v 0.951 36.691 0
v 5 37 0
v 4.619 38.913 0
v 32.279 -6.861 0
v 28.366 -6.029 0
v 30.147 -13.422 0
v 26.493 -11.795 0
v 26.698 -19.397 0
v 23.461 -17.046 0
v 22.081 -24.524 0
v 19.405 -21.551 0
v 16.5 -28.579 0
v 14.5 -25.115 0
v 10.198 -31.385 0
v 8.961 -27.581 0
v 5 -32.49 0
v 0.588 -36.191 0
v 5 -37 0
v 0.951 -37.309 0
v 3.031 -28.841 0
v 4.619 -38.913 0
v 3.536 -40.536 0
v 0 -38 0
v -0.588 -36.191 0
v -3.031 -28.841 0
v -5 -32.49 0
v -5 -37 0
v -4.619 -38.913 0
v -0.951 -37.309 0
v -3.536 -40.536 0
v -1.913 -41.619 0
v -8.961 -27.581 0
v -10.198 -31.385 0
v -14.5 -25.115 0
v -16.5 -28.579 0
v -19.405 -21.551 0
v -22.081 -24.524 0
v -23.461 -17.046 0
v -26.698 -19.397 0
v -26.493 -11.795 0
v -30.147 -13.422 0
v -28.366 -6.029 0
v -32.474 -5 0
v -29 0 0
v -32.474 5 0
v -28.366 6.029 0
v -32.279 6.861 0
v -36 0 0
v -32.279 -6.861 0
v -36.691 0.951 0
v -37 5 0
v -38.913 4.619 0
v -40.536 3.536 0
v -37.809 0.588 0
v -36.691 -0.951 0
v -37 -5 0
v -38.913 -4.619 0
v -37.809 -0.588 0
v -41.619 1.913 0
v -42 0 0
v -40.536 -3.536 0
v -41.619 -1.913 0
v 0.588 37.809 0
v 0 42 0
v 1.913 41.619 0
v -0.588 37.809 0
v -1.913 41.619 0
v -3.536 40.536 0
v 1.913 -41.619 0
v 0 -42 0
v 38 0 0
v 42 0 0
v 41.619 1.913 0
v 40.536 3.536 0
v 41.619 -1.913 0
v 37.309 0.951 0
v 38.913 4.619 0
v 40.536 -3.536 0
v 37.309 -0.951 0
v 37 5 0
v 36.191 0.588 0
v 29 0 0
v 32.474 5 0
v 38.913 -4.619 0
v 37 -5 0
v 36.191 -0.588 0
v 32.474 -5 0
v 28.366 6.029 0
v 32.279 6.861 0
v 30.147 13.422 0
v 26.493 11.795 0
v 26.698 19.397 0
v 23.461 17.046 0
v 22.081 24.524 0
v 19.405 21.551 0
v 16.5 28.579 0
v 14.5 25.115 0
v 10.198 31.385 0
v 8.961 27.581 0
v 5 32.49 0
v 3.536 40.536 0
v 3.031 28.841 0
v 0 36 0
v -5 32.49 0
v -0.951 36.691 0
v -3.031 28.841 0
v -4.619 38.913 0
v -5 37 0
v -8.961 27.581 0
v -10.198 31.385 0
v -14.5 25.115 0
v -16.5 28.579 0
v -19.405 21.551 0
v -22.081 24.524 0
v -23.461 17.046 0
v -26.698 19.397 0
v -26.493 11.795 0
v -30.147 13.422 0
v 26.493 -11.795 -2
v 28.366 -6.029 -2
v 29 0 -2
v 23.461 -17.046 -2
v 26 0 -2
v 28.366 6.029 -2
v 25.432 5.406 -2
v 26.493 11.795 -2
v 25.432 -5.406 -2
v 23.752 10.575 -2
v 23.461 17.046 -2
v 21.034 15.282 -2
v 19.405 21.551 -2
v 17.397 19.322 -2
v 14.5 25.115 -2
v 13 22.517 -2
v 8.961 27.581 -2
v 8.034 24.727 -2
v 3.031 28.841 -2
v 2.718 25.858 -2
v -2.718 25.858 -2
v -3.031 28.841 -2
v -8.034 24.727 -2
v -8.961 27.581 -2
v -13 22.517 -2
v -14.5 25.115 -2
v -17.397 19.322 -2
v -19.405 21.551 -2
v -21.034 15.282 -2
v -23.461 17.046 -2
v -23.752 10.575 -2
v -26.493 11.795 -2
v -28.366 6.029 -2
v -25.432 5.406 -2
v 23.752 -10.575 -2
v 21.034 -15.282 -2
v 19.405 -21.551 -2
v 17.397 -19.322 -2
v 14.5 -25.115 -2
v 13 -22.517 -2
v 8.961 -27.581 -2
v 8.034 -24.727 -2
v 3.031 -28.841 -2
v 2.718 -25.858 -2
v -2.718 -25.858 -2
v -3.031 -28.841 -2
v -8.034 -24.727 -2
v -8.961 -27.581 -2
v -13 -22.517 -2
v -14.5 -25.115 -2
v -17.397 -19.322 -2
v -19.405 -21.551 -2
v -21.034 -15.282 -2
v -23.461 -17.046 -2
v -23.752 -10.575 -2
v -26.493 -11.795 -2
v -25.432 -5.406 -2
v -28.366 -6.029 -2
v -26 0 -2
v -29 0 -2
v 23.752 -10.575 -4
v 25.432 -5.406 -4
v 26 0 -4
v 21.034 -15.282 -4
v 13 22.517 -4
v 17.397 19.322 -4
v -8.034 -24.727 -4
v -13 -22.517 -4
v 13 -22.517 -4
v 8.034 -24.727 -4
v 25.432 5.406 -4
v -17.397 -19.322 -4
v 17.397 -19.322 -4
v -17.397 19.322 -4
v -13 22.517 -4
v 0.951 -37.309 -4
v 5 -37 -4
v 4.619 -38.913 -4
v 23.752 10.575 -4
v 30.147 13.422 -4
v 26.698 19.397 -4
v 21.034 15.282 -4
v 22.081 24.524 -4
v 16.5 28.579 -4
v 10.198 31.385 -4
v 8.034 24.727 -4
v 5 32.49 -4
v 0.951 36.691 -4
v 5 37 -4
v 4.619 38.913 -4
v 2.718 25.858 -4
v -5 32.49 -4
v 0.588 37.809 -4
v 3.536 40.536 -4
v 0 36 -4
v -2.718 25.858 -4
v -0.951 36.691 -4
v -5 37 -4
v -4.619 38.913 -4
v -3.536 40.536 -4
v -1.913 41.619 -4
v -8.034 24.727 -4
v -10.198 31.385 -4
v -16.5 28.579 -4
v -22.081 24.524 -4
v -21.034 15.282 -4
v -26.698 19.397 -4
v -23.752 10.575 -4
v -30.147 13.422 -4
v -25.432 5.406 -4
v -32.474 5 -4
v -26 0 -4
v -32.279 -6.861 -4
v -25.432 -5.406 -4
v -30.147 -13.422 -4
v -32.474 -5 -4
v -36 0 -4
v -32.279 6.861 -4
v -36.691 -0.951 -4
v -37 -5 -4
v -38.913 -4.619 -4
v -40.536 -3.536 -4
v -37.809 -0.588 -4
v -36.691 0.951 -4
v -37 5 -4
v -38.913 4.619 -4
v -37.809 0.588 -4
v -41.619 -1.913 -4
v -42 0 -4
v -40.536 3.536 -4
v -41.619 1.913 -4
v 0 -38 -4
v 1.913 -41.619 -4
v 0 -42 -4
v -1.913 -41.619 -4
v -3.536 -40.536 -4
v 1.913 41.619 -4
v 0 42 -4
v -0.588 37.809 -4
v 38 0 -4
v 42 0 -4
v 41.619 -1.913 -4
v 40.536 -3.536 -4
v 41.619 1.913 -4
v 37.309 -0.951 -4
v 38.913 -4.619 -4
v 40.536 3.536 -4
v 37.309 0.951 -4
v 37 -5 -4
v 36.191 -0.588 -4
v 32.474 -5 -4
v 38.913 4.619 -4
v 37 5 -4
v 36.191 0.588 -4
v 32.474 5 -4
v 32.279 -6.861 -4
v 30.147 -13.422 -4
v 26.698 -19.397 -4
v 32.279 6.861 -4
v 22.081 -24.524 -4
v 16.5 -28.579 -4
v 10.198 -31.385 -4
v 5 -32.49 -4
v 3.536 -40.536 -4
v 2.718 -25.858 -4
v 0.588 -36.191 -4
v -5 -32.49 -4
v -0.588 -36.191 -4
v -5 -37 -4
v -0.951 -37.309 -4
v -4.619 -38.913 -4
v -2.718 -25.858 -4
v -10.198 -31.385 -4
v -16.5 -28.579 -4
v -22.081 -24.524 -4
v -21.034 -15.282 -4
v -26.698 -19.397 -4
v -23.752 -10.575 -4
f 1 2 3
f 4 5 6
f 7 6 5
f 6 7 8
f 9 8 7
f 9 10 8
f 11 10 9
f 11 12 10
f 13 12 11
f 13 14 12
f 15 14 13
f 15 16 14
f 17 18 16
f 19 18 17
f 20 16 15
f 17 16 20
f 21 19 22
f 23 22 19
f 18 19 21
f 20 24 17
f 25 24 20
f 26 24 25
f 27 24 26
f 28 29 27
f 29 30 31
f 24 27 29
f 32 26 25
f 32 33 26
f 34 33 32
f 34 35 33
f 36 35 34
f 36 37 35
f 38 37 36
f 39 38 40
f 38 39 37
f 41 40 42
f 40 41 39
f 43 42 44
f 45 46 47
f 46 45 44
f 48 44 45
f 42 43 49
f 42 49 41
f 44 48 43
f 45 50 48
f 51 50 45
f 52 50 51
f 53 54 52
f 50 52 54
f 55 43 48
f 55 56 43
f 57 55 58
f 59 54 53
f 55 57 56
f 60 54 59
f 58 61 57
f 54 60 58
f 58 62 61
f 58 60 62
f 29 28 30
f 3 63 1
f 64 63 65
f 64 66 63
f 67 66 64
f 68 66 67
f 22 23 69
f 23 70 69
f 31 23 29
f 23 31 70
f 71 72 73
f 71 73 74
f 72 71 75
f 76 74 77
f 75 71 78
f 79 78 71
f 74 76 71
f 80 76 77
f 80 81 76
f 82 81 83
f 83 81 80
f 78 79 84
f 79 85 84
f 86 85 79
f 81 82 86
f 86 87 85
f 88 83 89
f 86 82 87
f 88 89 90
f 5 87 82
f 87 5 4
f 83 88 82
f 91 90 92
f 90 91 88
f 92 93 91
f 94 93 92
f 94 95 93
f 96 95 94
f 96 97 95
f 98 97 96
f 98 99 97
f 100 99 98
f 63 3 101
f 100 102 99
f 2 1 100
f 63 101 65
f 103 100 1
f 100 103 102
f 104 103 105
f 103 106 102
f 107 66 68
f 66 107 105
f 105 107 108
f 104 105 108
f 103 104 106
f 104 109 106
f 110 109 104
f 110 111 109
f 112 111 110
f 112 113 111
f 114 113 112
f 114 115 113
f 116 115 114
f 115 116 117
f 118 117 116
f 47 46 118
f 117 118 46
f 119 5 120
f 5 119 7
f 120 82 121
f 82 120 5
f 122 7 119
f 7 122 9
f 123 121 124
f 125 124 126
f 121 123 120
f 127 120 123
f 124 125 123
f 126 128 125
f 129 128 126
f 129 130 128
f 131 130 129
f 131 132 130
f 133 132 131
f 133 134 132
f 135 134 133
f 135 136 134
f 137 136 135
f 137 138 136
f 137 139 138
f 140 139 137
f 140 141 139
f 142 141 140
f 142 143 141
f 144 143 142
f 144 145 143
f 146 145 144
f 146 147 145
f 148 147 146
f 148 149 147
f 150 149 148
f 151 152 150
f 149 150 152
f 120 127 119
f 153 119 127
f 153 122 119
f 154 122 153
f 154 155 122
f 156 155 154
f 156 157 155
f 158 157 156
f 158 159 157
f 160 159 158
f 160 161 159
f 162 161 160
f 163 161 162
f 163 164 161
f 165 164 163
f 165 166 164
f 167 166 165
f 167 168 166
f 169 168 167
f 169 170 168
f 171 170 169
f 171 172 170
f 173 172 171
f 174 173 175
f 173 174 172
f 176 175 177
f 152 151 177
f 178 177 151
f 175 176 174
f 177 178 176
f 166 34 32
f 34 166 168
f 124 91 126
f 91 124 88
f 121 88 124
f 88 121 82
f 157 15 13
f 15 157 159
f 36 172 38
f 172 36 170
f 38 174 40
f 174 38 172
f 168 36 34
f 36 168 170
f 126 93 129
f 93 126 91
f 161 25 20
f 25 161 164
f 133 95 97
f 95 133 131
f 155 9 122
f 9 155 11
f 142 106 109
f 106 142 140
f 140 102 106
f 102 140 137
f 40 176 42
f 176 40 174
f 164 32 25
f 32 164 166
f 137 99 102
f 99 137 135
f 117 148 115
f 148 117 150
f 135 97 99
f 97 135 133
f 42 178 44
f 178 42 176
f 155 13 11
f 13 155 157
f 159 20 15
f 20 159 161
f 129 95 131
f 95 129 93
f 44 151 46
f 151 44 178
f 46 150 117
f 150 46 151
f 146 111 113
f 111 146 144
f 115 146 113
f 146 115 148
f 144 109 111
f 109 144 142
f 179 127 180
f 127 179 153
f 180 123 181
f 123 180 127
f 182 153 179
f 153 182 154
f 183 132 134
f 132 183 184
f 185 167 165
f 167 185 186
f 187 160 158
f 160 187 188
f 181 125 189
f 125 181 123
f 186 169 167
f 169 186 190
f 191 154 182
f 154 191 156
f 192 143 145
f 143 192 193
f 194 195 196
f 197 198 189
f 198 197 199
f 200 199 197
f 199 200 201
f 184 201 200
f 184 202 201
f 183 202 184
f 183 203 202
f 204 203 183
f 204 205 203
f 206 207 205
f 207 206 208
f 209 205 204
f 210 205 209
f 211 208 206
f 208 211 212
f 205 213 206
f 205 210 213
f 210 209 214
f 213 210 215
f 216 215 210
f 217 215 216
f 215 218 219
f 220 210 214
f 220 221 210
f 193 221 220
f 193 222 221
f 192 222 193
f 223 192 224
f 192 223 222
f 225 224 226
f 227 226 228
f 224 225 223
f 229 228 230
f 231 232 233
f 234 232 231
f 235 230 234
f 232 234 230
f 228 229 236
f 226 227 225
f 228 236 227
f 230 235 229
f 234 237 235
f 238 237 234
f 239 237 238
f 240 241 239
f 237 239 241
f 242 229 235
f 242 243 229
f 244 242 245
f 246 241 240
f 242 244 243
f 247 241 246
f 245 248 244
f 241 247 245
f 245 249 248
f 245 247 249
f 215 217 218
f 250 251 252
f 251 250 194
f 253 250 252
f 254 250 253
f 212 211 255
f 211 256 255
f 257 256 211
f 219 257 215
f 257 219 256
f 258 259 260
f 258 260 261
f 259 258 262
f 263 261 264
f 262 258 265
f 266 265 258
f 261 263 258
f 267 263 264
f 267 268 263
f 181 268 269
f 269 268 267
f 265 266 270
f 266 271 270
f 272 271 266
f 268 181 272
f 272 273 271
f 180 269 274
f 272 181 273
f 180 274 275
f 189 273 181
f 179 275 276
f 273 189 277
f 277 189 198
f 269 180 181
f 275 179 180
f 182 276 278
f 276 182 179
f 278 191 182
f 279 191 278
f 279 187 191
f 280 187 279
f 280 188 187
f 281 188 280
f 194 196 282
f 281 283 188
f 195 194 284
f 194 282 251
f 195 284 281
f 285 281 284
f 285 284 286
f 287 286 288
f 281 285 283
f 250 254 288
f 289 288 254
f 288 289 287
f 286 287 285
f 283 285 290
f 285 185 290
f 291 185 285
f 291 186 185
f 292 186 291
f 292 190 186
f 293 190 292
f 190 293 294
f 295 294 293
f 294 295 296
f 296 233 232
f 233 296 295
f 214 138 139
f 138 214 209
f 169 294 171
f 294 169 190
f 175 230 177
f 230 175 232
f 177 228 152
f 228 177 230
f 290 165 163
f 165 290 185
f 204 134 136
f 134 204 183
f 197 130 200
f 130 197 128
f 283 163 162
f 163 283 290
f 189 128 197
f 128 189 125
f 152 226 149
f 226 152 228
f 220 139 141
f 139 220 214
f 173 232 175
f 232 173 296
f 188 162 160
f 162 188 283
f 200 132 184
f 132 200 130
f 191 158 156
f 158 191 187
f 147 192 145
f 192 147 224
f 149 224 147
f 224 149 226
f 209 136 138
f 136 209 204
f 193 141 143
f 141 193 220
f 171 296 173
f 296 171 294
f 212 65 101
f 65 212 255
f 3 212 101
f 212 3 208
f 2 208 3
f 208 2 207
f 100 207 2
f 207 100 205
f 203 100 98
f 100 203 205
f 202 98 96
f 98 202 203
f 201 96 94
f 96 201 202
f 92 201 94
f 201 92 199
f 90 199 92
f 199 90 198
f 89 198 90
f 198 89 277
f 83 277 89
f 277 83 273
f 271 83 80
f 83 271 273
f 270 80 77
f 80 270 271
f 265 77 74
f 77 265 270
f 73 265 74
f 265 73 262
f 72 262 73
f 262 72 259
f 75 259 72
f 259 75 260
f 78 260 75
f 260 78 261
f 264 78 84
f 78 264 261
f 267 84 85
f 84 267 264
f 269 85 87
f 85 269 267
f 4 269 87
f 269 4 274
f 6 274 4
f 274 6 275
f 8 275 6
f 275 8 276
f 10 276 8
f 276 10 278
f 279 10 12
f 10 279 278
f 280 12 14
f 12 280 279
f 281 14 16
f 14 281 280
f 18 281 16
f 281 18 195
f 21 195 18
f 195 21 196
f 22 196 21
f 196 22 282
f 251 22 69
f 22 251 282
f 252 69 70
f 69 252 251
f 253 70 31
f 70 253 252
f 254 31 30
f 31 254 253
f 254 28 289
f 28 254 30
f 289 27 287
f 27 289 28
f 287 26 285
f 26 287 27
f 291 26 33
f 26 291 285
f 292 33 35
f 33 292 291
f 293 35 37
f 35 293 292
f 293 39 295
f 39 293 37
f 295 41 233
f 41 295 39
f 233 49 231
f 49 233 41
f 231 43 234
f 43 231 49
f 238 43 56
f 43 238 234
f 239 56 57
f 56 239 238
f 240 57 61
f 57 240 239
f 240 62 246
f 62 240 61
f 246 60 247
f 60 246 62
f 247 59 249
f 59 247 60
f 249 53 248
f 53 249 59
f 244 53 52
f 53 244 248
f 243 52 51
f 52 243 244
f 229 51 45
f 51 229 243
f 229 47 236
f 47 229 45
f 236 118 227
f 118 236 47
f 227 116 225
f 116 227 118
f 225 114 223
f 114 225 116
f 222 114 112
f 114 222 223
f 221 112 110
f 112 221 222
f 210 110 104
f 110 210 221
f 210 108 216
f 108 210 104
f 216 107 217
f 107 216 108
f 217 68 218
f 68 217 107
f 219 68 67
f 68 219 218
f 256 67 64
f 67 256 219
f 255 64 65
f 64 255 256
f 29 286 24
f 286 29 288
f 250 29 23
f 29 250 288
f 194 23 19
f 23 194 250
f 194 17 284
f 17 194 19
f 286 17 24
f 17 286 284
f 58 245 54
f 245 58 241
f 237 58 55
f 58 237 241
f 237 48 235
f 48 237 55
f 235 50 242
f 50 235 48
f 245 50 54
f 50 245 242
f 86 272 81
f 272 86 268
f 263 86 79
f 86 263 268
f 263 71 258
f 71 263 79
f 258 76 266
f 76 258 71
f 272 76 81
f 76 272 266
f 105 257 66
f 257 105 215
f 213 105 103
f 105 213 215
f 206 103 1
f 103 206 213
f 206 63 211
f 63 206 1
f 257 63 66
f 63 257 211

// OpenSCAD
// Total width of the holder including the tabs
cross_length = 74;

// The width of the tabs the screws go into
cross_width = 10;

// The diameter of the round part
holder_diameter = 66;

// The speaker diameter; include some padding
speaker_diameter = 58;

// The size of the screw hole
screw_radius = 1;

// The depth of the part holding the speaker flange
flange_depth = 2;

// The width of the flange
flange_width = 3;

// The total height of the holder
height = 4;

// The size of the bounding box
bounding_size = cross_length + cross_width;

// The body
module drawclip() {
  circle(holder_diameter / 2);
  for (angle = [0, 90]) {
    rotate(angle) {
      difference() {
        hull() {
          translate([-cross_length/2, 0]) circle(cross_width/2);
          translate([cross_length/2, 0]) circle(cross_width/2);
        }
        union() {
          translate([-cross_length/2, 0]) circle(screw_radius);
          translate([cross_length/2, 0]) circle(screw_radius);
        }
      }
    }
  }
}

// The holes in the middle which hold the speaker
module  drawinside()  {
  difference() {
    difference() {
      translate([-bounding_size/2, -bounding_size/2, 0]) {
        cube([bounding_size, bounding_size, height*2]);
      }
      translate([0, 0, -0.0001])
        cylinder(h=flange_depth, r=speaker_diameter/2);
      cylinder(h=height, r = speaker_diameter/2 - flange_width);
    }
  }
}

// Flip it over so it prints without support
rotate([-180, 0, 0]) {
  intersection() {
    drawinside();
    linear_extrude(height=height) {
      drawclip();
    }
  }
}
